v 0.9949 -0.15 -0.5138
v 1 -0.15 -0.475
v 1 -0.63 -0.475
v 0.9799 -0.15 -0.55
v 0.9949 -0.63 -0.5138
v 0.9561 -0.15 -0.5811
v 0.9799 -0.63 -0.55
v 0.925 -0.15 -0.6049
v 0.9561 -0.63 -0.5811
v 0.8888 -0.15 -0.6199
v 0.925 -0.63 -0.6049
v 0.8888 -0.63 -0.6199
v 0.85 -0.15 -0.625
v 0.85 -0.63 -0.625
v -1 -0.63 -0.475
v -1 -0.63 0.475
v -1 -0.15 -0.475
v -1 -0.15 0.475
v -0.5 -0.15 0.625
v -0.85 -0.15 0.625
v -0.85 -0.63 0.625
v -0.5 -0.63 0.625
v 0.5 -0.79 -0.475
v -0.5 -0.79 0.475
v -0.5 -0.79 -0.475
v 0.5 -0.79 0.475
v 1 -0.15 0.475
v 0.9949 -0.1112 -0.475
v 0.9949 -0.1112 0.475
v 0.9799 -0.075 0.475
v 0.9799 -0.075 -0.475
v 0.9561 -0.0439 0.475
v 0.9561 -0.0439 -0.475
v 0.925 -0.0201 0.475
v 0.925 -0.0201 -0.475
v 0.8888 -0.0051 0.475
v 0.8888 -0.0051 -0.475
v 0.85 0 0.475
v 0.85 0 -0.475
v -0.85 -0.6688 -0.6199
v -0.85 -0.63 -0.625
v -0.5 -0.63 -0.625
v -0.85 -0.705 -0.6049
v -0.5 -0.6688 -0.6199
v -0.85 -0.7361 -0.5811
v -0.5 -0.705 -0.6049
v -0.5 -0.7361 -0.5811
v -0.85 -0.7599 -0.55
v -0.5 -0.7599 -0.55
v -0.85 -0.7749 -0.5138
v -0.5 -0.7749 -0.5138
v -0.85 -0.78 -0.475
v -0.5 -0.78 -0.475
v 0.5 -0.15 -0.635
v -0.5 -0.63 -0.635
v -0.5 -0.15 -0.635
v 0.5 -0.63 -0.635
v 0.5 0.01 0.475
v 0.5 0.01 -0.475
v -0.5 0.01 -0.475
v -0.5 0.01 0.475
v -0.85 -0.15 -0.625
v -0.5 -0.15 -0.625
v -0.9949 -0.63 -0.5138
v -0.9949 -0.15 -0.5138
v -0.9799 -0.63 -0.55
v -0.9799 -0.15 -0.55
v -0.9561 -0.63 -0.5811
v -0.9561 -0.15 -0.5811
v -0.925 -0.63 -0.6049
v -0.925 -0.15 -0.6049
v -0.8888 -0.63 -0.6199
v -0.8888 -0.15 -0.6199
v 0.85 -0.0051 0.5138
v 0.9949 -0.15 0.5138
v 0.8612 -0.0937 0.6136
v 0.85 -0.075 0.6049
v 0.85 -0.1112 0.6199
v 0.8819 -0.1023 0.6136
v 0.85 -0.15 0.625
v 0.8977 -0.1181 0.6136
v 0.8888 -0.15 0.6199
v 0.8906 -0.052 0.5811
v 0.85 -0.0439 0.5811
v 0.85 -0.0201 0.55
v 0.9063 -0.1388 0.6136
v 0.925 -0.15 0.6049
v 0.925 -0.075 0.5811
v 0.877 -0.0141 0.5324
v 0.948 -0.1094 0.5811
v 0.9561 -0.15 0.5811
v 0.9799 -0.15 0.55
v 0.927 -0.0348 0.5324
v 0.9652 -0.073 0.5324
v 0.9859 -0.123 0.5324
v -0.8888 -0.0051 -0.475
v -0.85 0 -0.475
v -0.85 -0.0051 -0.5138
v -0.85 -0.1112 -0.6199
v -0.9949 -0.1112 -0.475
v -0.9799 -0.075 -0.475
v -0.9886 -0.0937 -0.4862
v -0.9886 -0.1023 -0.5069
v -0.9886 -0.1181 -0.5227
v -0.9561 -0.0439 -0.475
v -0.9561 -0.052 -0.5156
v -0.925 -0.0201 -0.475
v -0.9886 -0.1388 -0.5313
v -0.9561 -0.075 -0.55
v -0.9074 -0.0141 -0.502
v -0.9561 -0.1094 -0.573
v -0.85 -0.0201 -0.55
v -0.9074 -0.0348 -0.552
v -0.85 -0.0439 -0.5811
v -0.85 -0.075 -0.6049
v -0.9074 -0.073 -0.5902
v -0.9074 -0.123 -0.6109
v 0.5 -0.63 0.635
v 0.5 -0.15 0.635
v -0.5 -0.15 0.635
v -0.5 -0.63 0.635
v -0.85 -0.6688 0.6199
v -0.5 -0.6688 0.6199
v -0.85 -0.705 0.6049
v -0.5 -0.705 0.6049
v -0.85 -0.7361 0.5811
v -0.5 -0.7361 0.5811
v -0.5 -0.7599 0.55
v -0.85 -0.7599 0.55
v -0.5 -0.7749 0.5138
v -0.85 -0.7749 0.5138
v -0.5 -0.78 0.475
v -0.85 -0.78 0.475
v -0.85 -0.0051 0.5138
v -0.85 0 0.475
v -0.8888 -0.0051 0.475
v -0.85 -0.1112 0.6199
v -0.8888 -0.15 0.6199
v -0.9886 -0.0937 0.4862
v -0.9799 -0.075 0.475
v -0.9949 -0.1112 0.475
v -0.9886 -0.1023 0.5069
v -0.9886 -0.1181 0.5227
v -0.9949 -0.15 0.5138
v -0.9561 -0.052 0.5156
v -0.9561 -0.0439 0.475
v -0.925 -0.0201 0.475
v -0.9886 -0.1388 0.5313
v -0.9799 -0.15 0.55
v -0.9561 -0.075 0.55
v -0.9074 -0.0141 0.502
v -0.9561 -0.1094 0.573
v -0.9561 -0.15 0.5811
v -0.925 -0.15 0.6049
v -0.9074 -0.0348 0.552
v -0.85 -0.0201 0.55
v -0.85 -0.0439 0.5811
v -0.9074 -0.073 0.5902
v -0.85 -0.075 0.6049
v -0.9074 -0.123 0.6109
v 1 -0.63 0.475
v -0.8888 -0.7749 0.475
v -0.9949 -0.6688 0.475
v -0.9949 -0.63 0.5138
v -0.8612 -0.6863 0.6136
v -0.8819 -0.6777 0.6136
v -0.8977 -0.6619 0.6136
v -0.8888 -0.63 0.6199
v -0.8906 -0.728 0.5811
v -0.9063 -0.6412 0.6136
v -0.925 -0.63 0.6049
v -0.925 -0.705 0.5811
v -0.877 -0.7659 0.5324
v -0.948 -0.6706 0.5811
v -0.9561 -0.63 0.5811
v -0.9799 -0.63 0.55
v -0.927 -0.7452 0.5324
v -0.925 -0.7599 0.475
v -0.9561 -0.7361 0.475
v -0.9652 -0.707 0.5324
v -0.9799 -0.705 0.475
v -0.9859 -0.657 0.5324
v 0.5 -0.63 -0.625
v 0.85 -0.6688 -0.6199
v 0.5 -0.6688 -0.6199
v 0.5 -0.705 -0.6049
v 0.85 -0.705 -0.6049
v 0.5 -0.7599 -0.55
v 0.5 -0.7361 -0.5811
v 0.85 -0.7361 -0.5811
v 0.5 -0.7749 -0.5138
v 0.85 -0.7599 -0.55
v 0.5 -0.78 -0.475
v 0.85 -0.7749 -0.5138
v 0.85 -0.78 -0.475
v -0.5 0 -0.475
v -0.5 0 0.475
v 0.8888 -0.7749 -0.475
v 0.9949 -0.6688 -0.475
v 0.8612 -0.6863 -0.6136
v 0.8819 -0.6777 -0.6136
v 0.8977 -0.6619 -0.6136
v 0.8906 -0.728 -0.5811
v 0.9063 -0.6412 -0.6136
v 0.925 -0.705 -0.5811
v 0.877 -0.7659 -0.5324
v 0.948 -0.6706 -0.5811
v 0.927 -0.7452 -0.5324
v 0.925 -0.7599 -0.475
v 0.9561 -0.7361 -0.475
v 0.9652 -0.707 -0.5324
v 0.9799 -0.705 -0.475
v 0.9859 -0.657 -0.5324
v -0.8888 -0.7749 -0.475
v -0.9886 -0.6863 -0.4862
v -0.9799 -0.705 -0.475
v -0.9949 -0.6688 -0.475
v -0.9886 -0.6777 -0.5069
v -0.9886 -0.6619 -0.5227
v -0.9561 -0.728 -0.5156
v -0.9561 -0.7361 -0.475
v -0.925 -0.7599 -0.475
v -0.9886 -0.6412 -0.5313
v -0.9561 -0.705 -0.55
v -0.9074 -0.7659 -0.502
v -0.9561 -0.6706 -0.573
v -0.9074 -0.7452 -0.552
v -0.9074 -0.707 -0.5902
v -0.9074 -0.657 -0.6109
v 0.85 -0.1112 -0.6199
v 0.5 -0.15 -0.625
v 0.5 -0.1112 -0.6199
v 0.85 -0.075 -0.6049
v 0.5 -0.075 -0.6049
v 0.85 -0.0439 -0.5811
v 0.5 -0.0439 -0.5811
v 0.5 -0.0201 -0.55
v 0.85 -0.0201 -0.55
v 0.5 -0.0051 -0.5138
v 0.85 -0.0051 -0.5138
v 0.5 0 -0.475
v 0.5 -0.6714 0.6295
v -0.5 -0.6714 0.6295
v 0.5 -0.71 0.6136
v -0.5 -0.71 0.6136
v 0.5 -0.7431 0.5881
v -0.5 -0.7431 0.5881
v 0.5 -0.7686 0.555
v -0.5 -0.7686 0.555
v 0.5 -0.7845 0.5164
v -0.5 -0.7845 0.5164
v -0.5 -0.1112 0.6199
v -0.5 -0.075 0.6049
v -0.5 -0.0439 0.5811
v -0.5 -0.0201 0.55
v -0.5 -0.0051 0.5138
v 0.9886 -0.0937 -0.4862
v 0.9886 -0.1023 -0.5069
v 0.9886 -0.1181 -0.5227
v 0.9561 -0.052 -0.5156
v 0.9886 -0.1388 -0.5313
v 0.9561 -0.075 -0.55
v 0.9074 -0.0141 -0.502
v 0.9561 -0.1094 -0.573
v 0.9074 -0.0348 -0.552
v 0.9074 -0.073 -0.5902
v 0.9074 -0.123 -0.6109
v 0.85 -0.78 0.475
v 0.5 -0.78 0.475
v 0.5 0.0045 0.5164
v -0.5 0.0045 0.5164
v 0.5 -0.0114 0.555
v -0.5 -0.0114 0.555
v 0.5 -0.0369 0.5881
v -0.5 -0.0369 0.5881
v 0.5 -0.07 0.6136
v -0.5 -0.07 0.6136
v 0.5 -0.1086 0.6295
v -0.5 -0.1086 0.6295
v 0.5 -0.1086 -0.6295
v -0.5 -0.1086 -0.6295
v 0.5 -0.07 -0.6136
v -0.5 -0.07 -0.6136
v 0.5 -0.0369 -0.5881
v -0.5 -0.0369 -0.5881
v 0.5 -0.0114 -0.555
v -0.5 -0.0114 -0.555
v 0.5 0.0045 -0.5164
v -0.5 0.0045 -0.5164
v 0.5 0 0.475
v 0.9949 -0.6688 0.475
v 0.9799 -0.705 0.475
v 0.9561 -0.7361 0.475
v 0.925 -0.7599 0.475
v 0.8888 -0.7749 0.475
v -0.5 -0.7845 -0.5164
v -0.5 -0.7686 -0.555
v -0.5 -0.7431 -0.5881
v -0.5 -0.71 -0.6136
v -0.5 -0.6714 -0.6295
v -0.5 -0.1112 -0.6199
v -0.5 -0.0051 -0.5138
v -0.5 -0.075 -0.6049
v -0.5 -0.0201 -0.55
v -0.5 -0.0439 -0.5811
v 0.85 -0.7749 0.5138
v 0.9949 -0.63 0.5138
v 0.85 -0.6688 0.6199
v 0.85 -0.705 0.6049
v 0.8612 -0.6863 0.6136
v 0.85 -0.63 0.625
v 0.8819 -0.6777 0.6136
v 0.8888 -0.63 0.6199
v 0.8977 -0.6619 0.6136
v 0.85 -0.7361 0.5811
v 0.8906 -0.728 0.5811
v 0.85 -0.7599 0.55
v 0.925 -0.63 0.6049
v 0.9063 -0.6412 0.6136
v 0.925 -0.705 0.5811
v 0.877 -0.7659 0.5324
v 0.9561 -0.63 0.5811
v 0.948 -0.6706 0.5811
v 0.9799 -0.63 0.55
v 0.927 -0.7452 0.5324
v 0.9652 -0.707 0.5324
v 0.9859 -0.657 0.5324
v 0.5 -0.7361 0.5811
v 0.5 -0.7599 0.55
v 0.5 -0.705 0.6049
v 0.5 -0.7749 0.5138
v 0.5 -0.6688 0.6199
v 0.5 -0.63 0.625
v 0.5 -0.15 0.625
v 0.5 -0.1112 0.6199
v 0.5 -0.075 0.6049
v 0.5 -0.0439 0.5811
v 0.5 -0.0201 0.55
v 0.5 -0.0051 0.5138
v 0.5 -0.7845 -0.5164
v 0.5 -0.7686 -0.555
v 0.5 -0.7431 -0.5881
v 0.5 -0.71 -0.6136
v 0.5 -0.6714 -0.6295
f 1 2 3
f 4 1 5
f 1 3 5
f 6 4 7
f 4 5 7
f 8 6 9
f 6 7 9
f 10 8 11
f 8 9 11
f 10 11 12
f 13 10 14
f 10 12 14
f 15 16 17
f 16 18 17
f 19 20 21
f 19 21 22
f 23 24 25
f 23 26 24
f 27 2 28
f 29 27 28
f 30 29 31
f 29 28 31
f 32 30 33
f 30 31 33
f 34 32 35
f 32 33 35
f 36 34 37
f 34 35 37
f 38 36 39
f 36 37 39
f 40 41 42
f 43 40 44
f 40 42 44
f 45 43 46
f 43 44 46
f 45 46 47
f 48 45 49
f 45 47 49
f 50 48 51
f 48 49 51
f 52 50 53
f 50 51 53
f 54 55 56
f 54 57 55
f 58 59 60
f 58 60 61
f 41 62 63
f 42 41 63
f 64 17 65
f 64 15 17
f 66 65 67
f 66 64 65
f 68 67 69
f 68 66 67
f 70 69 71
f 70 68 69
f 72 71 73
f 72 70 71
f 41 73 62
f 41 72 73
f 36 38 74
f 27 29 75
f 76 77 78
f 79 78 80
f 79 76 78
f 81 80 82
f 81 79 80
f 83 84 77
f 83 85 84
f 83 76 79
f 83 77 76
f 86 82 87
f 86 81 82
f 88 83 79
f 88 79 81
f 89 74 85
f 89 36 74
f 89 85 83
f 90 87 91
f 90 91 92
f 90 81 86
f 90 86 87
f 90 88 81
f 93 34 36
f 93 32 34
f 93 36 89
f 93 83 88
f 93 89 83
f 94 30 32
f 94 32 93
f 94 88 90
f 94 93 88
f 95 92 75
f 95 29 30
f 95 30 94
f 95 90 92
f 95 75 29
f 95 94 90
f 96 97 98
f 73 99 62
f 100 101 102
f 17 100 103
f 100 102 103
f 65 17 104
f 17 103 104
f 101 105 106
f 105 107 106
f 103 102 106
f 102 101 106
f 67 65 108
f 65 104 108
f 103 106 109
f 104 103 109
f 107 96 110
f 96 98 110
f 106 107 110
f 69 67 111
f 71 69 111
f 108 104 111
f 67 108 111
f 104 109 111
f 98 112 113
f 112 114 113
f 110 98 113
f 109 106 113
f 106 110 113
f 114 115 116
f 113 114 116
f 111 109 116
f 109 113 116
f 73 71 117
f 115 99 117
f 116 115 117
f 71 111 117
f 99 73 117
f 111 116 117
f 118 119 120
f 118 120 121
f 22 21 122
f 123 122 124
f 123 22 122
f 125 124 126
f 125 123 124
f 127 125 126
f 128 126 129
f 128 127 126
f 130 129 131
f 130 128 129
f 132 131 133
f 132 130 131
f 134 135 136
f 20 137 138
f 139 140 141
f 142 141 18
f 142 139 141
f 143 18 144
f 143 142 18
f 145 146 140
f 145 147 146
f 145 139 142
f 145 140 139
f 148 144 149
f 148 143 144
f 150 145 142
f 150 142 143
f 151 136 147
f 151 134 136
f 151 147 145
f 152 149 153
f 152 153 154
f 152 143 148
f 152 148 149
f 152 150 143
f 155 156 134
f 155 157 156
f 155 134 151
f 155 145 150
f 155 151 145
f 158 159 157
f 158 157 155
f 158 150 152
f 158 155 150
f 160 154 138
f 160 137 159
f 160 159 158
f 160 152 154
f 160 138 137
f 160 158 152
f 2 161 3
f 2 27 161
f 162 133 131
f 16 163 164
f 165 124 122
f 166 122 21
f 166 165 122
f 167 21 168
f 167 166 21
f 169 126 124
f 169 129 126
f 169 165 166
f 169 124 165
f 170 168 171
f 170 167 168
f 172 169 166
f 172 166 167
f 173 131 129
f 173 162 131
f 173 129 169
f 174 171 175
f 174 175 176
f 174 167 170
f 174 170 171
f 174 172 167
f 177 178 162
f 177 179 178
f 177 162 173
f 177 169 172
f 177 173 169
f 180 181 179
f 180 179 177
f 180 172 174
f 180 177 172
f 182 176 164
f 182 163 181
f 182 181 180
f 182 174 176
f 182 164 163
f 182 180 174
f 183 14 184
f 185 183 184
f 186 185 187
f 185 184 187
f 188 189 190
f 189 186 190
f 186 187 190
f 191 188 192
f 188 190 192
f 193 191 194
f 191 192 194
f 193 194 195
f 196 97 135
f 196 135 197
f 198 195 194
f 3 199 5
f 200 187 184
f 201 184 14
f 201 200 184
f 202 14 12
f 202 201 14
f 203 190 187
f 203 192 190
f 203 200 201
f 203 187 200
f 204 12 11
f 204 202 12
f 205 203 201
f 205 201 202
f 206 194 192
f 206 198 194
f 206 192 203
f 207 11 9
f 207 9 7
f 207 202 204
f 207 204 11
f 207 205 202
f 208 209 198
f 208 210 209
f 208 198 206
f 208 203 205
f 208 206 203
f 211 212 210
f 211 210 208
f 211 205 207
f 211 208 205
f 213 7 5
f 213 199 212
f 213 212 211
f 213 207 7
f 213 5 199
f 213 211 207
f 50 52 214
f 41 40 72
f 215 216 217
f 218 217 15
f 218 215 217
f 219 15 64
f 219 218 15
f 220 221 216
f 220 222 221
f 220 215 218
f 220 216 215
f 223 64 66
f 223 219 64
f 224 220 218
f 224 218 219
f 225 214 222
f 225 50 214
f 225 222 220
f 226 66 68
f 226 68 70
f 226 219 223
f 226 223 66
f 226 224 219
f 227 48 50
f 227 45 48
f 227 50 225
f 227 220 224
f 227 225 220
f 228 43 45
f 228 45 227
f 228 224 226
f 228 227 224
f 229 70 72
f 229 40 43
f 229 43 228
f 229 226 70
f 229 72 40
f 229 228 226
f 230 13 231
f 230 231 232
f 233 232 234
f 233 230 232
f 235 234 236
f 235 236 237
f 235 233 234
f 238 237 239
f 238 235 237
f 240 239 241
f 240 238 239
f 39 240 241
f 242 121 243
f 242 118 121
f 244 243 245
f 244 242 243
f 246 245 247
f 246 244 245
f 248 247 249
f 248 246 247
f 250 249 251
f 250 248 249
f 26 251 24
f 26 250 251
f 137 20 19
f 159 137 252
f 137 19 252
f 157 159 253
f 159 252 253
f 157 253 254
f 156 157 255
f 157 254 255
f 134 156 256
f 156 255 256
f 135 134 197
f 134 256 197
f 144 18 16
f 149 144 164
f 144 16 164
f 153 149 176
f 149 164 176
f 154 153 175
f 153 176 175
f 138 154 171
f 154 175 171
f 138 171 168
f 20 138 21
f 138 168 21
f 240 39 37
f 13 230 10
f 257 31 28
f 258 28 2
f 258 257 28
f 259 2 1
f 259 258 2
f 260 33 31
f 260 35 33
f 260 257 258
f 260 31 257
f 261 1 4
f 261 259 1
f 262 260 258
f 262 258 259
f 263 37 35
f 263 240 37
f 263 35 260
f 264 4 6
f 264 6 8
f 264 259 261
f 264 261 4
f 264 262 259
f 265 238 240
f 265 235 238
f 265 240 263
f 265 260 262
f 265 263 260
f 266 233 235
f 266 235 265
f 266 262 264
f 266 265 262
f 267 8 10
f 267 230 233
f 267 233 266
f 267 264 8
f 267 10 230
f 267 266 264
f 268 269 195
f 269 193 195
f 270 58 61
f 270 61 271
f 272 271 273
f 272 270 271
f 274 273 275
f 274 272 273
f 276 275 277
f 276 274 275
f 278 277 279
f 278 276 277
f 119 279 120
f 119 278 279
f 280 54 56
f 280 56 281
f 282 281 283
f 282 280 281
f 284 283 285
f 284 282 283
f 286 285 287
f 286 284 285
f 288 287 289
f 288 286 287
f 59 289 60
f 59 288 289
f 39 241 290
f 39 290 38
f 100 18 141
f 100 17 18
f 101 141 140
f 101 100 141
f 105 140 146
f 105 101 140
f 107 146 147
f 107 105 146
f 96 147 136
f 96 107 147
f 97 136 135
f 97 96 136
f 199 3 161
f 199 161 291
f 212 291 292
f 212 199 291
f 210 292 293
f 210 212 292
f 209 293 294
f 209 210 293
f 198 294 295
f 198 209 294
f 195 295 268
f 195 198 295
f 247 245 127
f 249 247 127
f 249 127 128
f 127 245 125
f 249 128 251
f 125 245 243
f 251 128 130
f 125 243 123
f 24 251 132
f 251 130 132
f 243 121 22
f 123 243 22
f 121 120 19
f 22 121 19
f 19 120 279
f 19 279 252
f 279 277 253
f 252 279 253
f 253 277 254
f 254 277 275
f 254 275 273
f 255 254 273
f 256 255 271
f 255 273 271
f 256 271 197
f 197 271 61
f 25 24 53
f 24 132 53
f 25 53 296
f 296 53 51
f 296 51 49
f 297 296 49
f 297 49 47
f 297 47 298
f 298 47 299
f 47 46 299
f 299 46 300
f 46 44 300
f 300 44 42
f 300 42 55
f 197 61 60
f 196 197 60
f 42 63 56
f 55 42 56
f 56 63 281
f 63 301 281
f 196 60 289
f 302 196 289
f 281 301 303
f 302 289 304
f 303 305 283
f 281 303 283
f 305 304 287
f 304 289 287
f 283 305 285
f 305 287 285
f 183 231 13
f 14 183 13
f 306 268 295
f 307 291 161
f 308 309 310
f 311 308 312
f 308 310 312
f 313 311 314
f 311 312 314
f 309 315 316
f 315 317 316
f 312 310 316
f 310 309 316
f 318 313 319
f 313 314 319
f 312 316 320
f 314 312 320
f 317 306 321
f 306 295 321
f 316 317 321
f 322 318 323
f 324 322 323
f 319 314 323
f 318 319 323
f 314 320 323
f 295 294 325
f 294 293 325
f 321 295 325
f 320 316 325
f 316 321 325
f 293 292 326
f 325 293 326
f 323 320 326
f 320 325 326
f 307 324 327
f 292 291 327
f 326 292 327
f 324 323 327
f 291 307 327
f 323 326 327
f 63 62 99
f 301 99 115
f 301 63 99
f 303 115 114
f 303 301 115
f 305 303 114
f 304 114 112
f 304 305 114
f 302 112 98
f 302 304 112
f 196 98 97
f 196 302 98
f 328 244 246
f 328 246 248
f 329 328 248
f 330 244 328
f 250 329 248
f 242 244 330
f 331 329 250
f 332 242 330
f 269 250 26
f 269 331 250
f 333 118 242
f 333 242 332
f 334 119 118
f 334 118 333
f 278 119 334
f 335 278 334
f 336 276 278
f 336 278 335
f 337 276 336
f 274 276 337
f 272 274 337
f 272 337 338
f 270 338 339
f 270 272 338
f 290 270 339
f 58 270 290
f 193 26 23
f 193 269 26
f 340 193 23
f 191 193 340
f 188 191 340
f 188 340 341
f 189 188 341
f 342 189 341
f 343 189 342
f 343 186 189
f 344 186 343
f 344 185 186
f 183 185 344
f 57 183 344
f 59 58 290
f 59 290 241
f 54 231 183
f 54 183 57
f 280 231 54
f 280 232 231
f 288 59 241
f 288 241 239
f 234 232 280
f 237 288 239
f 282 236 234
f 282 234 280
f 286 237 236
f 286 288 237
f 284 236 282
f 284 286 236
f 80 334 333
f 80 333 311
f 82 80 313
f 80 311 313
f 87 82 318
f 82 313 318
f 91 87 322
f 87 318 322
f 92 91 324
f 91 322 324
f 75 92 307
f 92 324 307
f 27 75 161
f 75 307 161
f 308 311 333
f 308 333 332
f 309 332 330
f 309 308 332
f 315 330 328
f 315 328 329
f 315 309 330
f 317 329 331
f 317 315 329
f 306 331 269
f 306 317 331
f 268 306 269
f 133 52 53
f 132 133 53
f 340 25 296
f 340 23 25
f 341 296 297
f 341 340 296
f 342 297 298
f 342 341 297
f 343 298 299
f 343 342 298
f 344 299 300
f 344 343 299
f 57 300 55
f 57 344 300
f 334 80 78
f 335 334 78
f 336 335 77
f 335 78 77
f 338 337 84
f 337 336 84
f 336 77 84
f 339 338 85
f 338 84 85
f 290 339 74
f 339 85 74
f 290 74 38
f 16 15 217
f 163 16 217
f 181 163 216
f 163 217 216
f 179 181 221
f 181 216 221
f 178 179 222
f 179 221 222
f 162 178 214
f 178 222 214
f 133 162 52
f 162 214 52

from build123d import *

# Parameters (mm, degrees)
ESBO_O1_W                     = 2
ESBO_O1_H                     = 1.25
RESSALTO_EXTRUS_O1_DEPTH      = 0.78
FILETE1_R                     = 0.15
RESSALTO_EXTRUS_O4_DEPTH      = 0.5
RESSALTO_EXTRUS_O4_DEPTH_BACK = 0.5


with BuildPart() as part:
    # Esboço1 → Ressalto-extrusão1 (new body)
    with BuildSketch(Plane(origin=(0, 0, 0), x_dir=(1, 0, 0), z_dir=(0, 1, 0))):
        Rectangle(ESBO_O1_W, ESBO_O1_H)
    extrude(amount=-RESSALTO_EXTRUS_O1_DEPTH)

    # Filete1
    filete1_edges = [part.edges().sort_by_distance(p)[0] for p in [
        (1, -0.78, 0),
        (0, -0.78, -0.625),
        (-1, -0.78, 0),
        (0, 0, -0.625),
        (1, 0, 0),
        (0, 0, 0.625),
        (-1, 0, 0),
        (0, -0.78, 0.625),
        (-1, -0.39, -0.625),
        (1, -0.39, -0.625),
        (1, -0.39, 0.625),
        (-1, -0.39, 0.625),
    ]]
    fillet(filete1_edges, radius=FILETE1_R)

    # Esboço4 → Ressalto-extrusão4 (add, two sides)
    with BuildSketch(Plane(origin=(0, 0, 0), x_dir=(0, 0, -1), z_dir=(1, 0, 0))) as ressalto_extrus_o4_sk:
        with BuildLine():
            Line((0.635, -0.63), (0.635, -0.15))
            ThreePointArc((0.635, -0.15), (0.588137085, -0.036862915), (0.475, 0.01))
            Line((0.475, 0.01), (-0.475, 0.01))
            ThreePointArc((-0.475, 0.01), (-0.588137085, -0.036862915), (-0.635, -0.15))
            Line((-0.635, -0.15), (-0.635, -0.63))
            ThreePointArc((-0.635, -0.63), (-0.588137085, -0.743137085), (-0.475, -0.79))
            Line((-0.475, -0.79), (0.475, -0.79))
            ThreePointArc((0.475, -0.79), (0.588137085, -0.743137085), (0.635, -0.63))
        make_face()
        with BuildLine():
            Line((0.625, -0.63), (0.625, -0.15))
            ThreePointArc((0.625, -0.15), (0.581066017, -0.043933983), (0.475, 0))
            Line((0.475, 0), (-0.475, 0))
            ThreePointArc((-0.475, 0), (-0.581066017, -0.043933983), (-0.625, -0.15))
            Line((-0.625, -0.15), (-0.625, -0.63))
            ThreePointArc((-0.625, -0.63), (-0.581066017, -0.736066017), (-0.475, -0.78))
            Line((-0.475, -0.78), (0.475, -0.78))
            ThreePointArc((0.475, -0.78), (0.581066017, -0.736066017), (0.625, -0.63))
        make_face(mode=Mode.SUBTRACT)
    extrude(amount=RESSALTO_EXTRUS_O4_DEPTH)
    extrude(ressalto_extrus_o4_sk.sketch, amount=-RESSALTO_EXTRUS_O4_DEPTH_BACK)


solid = part.part
